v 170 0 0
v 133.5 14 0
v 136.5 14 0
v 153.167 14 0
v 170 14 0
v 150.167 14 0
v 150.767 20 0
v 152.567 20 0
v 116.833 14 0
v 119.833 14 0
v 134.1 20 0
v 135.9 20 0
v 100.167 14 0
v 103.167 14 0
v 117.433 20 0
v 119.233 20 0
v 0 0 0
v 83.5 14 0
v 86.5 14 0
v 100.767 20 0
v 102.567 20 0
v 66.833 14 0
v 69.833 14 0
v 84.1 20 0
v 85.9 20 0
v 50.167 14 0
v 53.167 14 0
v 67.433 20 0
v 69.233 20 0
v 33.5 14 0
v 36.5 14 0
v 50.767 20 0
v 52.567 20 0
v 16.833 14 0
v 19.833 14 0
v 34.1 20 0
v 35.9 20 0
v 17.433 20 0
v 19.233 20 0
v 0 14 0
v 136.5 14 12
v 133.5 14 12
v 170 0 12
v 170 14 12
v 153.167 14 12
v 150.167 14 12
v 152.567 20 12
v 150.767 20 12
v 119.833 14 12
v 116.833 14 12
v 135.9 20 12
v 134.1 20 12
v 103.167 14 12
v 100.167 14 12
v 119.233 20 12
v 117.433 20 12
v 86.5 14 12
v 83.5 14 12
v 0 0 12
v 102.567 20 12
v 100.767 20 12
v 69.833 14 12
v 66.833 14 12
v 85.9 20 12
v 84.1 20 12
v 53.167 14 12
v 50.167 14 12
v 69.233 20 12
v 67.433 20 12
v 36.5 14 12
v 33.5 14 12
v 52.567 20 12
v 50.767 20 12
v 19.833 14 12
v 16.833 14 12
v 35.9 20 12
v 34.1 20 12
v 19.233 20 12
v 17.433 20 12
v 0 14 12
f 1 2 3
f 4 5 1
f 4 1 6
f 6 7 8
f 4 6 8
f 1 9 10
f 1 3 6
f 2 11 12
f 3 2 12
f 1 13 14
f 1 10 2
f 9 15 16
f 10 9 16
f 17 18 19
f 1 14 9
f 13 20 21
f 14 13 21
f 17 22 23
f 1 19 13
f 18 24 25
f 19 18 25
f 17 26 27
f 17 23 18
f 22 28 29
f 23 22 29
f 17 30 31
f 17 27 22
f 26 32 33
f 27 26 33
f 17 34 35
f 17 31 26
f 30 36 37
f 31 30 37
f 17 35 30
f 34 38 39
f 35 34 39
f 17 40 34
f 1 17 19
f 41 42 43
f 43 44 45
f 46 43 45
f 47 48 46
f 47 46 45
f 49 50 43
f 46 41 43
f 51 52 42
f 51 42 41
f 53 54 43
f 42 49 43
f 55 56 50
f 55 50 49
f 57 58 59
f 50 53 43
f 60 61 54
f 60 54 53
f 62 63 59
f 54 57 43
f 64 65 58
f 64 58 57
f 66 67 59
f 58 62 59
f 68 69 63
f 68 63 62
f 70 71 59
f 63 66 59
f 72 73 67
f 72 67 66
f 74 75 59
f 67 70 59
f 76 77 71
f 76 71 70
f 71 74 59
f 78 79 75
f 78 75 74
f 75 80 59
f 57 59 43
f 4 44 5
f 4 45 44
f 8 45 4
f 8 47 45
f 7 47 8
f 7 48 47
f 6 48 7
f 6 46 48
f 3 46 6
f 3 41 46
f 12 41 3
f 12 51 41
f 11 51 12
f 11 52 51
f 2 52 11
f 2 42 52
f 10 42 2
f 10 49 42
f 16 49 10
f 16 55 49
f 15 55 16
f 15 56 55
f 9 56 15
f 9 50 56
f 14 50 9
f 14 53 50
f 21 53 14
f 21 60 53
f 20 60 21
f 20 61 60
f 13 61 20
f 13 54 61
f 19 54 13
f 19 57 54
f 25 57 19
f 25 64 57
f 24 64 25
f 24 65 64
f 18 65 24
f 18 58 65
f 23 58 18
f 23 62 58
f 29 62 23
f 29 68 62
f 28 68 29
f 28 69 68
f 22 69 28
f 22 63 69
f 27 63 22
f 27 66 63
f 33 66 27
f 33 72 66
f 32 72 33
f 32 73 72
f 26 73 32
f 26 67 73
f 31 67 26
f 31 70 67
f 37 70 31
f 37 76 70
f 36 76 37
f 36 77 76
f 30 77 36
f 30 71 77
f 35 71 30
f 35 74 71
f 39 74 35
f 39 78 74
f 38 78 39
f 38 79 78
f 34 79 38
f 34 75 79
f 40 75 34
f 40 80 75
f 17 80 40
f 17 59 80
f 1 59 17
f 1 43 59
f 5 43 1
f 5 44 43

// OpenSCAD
$fn = 32;

// ----------------------------------------------------------------------
// Gear rack: 9 teeth on a 170 mm bar, pitch 16.67 mm
// ----------------------------------------------------------------------

// --- parameters (mm) ---
profile_height = 12;      // extrusion height
profile_points = 40;      // points of the closed outline

profile = [[0, 0], [170, 0], [170, 14], [153.167, 14], [152.567, 20], [150.767, 20], [150.167, 14], [136.5, 14], [135.9, 20], [134.1, 20], [133.5, 14], [119.833, 14], [119.233, 20], [117.433, 20], [116.833, 14], [103.167, 14], [102.567, 20], [100.767, 20], [100.167, 14], [86.5, 14], [85.9, 20], [84.1, 20], [83.5, 14], [69.833, 14], [69.233, 20], [67.433, 20], [66.833, 14], [53.167, 14], [52.567, 20], [50.767, 20], [50.167, 14], [36.5, 14], [35.9, 20], [34.1, 20], [33.5, 14], [19.833, 14], [19.233, 20], [17.433, 20], [16.833, 14], [0, 14]];  // single closed polygon, 40 points, counter clockwise

// --- the one profile operation ---
linear_extrude(height = profile_height) polygon(points = profile);
